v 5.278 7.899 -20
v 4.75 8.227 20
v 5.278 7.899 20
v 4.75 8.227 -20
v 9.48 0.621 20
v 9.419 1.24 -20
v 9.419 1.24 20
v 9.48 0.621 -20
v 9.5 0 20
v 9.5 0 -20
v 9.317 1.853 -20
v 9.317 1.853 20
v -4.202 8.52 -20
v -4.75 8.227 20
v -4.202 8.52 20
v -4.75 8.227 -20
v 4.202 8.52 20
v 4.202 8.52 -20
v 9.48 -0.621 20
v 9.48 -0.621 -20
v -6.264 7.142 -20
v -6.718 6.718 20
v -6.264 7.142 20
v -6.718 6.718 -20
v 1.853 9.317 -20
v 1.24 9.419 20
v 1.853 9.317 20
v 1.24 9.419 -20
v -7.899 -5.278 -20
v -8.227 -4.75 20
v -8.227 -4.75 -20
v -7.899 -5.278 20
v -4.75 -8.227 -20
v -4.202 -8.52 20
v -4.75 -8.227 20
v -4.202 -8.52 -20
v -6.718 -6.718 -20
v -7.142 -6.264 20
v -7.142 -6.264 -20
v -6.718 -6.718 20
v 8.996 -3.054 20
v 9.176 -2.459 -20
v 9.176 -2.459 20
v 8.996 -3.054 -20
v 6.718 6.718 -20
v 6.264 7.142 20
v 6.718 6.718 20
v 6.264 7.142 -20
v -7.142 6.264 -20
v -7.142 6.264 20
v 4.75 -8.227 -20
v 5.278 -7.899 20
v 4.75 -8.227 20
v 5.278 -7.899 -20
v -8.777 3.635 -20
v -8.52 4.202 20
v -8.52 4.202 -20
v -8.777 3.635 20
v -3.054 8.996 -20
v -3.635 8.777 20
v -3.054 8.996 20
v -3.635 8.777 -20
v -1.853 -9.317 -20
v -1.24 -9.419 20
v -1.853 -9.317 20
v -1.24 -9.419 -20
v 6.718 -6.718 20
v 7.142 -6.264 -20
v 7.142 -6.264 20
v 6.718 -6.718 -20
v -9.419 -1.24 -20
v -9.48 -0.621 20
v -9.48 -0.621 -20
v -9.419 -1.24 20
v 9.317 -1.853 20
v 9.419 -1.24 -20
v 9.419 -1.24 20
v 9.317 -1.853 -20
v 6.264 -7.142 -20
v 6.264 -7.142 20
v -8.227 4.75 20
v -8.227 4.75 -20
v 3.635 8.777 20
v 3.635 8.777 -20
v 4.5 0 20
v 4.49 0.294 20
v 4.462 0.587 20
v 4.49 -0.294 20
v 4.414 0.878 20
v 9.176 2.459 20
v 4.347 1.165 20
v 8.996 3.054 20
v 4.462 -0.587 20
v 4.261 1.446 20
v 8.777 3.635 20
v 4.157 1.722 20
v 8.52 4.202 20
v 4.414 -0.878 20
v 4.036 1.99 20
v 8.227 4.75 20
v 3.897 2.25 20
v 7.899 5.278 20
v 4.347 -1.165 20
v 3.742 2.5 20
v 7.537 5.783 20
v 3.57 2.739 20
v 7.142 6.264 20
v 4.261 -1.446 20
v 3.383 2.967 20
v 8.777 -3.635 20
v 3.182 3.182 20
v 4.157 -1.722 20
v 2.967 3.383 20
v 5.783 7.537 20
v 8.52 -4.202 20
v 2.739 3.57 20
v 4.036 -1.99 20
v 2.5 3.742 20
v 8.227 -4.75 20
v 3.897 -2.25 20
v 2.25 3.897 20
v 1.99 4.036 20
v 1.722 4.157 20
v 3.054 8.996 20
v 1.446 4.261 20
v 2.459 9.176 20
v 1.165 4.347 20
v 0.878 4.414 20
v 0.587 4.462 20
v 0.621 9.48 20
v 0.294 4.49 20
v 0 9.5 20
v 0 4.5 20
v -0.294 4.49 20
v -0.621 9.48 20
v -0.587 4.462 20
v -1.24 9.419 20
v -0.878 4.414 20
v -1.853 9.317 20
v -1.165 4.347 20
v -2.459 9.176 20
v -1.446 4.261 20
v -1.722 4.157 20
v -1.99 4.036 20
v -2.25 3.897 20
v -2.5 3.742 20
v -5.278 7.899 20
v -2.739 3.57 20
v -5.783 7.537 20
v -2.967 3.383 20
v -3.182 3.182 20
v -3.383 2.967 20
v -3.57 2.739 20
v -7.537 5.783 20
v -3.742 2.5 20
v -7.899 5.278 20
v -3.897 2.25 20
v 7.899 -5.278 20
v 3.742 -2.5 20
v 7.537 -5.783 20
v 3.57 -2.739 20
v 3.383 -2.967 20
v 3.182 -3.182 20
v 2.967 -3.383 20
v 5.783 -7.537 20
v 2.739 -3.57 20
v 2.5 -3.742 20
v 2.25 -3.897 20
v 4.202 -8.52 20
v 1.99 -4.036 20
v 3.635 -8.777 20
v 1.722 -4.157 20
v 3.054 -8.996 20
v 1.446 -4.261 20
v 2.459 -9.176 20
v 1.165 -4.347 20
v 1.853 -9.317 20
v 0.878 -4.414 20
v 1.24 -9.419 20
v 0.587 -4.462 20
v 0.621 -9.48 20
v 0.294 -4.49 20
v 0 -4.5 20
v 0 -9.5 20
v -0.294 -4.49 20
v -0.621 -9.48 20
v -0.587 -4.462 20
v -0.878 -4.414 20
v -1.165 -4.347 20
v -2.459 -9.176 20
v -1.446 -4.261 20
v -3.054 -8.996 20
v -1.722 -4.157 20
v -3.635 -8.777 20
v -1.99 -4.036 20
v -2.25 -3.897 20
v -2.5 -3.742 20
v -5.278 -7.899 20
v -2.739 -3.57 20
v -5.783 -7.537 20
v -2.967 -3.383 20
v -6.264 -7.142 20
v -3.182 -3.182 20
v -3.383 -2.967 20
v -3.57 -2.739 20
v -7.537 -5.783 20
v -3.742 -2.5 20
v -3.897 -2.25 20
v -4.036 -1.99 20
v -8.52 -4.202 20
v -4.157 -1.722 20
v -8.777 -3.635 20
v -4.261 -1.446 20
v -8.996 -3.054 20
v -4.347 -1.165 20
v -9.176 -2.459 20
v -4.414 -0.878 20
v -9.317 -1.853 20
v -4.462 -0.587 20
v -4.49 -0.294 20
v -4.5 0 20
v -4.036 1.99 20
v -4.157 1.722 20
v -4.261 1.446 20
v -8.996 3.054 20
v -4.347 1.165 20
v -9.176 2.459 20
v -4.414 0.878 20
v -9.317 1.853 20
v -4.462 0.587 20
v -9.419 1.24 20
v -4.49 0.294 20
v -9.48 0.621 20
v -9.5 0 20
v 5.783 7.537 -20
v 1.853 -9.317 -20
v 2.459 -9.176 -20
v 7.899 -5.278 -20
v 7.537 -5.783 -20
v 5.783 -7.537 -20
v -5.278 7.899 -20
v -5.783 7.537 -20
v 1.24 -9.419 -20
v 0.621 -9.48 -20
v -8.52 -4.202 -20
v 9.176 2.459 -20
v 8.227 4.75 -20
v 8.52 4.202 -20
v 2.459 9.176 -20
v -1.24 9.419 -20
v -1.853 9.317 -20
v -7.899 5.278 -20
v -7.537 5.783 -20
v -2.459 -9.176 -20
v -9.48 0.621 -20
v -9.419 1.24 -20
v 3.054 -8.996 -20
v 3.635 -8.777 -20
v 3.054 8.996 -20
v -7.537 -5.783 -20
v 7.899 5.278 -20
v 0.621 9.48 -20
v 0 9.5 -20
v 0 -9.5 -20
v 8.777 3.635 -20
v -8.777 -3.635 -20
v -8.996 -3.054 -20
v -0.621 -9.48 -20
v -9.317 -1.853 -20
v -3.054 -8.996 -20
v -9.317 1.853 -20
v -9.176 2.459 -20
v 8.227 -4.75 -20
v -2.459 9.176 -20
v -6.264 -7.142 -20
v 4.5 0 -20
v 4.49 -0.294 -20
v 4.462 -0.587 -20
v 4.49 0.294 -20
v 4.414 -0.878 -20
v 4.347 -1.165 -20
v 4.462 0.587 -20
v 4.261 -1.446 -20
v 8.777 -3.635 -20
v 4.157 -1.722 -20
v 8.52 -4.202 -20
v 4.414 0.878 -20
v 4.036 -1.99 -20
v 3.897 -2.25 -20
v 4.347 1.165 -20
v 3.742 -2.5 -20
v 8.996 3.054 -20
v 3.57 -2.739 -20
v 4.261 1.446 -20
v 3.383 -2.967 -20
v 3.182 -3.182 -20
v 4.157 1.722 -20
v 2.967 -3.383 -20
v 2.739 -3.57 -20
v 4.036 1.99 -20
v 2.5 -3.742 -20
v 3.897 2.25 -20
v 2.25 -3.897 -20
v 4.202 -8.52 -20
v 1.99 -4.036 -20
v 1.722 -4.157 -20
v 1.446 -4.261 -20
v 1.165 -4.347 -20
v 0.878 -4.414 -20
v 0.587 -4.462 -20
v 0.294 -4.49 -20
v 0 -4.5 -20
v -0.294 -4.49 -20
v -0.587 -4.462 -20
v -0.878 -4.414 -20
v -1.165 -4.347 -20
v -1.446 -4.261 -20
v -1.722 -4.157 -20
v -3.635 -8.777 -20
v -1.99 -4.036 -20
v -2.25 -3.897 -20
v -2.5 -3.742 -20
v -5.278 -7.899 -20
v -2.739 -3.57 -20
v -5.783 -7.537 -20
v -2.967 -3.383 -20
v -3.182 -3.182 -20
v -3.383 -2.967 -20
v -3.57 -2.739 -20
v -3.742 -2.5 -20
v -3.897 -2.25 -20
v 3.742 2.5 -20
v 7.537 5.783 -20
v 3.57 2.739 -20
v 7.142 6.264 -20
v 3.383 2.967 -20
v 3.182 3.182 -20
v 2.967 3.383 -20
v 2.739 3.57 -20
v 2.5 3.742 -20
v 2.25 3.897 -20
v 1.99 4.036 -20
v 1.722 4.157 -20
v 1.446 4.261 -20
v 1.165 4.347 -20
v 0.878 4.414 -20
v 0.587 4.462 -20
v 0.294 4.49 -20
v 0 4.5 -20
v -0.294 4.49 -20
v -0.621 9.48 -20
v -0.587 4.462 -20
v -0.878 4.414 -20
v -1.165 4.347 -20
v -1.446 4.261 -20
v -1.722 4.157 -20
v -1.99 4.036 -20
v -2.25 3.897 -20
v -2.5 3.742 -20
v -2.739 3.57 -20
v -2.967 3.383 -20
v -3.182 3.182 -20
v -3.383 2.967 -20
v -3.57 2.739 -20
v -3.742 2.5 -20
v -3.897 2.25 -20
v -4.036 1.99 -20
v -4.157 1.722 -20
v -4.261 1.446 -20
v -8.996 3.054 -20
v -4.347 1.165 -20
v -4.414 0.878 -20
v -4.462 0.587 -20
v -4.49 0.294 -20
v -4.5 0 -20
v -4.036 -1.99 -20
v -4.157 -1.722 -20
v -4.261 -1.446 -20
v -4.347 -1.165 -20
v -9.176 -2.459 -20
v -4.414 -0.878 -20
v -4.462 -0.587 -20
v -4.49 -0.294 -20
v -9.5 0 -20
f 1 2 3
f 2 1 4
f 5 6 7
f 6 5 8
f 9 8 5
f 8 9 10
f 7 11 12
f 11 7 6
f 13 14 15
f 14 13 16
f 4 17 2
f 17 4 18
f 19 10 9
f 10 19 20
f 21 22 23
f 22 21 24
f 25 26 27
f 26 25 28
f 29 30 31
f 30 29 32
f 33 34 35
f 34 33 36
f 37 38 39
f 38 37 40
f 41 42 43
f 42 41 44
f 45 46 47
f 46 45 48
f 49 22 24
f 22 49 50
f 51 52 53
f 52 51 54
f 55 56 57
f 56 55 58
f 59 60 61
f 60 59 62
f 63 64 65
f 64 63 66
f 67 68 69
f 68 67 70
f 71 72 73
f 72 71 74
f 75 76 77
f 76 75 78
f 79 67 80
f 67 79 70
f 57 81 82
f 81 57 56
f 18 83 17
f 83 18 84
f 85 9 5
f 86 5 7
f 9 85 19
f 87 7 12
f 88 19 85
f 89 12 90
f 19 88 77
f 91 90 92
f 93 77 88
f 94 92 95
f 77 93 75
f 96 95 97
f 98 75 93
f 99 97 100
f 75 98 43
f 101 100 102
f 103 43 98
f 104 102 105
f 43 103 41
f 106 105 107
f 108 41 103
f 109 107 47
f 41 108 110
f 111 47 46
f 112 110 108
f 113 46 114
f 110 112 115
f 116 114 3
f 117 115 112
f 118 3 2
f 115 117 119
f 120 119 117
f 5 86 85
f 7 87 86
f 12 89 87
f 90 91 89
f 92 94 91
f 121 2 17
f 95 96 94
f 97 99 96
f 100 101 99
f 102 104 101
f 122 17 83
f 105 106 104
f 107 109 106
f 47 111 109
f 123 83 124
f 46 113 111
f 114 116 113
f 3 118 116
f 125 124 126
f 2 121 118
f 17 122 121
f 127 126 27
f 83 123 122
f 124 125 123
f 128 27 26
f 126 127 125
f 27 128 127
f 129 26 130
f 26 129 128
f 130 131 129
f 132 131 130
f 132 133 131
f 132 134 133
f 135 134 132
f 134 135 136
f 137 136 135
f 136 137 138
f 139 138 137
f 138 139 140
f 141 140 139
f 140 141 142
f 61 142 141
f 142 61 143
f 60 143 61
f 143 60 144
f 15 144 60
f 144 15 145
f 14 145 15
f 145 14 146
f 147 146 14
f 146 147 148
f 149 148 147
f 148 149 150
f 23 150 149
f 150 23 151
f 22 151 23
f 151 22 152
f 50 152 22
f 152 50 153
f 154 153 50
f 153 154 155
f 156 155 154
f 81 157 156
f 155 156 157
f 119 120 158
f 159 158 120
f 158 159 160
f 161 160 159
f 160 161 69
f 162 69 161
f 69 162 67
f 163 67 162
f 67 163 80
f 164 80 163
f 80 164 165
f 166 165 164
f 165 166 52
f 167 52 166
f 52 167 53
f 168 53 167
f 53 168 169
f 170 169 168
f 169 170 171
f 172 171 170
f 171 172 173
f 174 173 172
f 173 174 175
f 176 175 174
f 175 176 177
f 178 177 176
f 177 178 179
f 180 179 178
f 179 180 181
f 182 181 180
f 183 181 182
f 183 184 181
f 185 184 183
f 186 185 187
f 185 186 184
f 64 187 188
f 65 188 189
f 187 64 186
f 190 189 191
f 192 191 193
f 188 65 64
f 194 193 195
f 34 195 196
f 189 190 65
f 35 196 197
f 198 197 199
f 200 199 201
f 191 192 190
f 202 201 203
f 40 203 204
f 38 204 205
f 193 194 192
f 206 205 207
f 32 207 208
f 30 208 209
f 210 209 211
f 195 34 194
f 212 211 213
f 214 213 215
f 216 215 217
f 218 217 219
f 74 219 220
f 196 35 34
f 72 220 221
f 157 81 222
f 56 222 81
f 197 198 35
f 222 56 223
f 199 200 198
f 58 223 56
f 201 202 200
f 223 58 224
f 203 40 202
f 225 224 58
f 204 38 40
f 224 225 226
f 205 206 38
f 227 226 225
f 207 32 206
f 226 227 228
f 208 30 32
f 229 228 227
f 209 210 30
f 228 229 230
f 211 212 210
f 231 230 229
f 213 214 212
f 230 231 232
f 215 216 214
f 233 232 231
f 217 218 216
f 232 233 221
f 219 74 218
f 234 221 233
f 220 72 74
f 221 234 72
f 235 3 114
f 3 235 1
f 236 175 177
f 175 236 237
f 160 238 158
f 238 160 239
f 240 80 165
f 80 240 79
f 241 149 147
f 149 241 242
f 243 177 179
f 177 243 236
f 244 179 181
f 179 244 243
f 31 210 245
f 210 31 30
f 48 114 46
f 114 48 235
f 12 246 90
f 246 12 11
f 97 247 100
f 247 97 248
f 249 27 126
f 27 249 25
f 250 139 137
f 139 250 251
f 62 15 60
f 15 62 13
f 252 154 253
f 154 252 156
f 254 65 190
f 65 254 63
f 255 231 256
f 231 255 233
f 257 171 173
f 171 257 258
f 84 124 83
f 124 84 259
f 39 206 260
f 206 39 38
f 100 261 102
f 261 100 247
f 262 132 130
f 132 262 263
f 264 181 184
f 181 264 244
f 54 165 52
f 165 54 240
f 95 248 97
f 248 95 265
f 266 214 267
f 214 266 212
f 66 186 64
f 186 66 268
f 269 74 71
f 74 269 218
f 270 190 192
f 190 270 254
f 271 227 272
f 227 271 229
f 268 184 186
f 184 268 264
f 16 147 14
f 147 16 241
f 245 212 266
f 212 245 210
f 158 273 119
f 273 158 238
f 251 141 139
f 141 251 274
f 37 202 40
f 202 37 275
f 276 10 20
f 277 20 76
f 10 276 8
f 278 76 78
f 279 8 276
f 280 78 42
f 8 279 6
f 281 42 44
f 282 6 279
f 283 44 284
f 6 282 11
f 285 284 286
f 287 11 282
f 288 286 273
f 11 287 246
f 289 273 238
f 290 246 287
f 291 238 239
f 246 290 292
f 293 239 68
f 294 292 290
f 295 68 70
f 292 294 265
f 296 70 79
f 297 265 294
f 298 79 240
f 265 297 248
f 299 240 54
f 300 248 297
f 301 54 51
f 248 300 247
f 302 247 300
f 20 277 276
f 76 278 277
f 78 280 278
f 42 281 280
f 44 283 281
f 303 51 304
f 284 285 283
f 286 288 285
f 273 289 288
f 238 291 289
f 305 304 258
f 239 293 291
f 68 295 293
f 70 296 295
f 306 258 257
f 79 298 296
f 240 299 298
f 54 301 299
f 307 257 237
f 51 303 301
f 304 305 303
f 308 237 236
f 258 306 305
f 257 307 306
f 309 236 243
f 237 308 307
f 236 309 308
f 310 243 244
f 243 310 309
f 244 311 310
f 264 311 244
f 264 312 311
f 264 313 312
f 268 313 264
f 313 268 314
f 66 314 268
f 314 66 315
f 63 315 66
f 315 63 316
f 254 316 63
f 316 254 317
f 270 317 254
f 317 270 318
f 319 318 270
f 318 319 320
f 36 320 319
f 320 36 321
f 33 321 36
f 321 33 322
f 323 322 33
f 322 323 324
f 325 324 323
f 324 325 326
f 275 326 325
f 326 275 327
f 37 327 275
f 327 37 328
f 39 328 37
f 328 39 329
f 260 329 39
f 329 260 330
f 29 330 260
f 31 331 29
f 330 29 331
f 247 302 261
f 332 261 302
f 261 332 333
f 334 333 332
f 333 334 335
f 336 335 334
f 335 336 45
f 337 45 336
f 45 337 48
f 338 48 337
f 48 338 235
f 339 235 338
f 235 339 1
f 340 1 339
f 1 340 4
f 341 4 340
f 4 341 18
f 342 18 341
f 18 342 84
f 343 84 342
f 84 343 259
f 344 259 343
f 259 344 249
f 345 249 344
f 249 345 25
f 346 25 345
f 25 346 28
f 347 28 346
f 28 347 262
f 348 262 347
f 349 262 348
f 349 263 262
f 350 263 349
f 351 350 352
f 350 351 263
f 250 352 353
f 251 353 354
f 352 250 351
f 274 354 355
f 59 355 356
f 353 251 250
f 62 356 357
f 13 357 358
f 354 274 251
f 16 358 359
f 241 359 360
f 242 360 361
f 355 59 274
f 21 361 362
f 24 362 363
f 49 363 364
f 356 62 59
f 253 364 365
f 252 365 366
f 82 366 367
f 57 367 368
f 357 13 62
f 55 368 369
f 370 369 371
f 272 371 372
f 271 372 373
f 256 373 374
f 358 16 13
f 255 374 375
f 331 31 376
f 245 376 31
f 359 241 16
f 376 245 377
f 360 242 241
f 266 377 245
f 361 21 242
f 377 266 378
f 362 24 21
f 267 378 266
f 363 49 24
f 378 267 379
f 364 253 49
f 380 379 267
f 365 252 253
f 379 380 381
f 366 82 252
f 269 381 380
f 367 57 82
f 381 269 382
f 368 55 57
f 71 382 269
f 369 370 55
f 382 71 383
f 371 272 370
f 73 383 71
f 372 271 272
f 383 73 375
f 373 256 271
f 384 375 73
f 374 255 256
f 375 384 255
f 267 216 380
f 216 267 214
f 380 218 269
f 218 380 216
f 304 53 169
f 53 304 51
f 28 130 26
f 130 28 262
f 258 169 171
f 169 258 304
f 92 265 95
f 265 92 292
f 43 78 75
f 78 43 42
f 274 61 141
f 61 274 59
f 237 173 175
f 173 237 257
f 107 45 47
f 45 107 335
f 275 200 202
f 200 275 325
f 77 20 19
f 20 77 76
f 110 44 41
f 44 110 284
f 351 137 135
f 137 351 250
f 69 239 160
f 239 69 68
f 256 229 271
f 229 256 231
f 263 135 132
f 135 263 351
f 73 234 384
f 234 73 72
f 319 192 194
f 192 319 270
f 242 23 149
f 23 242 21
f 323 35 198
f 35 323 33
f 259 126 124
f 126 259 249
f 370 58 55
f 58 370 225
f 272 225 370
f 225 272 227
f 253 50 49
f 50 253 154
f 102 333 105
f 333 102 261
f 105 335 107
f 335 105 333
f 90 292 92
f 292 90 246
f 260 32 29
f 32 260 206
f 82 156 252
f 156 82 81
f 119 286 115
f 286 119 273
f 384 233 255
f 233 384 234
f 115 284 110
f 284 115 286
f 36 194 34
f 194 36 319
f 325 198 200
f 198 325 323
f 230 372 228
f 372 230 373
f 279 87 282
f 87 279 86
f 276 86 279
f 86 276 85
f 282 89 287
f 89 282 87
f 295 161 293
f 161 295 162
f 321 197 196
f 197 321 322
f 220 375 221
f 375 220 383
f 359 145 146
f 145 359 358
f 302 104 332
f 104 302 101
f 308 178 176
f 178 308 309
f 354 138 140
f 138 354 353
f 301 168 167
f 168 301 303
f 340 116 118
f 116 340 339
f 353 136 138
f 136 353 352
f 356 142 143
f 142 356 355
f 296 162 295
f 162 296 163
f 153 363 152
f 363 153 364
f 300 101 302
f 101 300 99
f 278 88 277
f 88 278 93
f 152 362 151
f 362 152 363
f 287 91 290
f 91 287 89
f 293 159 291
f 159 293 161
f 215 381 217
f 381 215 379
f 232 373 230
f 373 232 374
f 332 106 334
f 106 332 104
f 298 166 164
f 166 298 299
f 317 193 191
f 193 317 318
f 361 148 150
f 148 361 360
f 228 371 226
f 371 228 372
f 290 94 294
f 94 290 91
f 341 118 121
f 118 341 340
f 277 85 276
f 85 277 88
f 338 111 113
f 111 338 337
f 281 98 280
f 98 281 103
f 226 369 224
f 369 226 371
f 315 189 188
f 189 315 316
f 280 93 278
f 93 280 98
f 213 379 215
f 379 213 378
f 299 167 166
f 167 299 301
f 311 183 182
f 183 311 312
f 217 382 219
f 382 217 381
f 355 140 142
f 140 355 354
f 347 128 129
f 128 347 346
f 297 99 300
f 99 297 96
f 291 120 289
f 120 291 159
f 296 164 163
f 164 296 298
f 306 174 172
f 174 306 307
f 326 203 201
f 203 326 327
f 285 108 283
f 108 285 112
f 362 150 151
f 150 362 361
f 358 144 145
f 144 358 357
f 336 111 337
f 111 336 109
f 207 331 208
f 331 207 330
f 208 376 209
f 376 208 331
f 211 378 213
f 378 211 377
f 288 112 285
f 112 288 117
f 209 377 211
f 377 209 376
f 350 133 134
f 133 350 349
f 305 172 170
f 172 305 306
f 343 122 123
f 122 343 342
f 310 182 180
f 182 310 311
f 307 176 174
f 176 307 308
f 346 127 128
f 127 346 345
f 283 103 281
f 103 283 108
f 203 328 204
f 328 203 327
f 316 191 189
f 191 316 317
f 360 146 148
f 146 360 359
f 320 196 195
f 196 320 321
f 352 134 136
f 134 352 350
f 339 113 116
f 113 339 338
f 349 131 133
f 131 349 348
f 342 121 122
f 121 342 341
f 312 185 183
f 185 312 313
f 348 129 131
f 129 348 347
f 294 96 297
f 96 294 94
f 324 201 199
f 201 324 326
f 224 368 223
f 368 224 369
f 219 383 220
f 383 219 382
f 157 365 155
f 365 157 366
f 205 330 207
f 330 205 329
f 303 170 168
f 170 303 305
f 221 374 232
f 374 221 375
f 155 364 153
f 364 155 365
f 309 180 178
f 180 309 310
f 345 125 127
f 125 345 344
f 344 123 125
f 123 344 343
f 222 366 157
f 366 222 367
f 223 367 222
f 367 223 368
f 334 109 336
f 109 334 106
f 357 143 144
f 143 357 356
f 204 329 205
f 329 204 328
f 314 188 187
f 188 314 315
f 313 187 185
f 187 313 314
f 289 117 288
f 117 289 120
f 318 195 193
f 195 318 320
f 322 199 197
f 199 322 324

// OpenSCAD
// Optionale spacers in case M8 bolds are long
// speedup closing winged nuts
// 4 * 2 = 8 pieces

M8=9.0;        // ! for easy insertion on M8 bold
  

Height=40;


difference()
{
cylinder(h=Height,d=M8+10,center=true,$fn=96);
 cylinder(h=Height+1,d=M8,center=true,$fn=96) ;  
    
}
